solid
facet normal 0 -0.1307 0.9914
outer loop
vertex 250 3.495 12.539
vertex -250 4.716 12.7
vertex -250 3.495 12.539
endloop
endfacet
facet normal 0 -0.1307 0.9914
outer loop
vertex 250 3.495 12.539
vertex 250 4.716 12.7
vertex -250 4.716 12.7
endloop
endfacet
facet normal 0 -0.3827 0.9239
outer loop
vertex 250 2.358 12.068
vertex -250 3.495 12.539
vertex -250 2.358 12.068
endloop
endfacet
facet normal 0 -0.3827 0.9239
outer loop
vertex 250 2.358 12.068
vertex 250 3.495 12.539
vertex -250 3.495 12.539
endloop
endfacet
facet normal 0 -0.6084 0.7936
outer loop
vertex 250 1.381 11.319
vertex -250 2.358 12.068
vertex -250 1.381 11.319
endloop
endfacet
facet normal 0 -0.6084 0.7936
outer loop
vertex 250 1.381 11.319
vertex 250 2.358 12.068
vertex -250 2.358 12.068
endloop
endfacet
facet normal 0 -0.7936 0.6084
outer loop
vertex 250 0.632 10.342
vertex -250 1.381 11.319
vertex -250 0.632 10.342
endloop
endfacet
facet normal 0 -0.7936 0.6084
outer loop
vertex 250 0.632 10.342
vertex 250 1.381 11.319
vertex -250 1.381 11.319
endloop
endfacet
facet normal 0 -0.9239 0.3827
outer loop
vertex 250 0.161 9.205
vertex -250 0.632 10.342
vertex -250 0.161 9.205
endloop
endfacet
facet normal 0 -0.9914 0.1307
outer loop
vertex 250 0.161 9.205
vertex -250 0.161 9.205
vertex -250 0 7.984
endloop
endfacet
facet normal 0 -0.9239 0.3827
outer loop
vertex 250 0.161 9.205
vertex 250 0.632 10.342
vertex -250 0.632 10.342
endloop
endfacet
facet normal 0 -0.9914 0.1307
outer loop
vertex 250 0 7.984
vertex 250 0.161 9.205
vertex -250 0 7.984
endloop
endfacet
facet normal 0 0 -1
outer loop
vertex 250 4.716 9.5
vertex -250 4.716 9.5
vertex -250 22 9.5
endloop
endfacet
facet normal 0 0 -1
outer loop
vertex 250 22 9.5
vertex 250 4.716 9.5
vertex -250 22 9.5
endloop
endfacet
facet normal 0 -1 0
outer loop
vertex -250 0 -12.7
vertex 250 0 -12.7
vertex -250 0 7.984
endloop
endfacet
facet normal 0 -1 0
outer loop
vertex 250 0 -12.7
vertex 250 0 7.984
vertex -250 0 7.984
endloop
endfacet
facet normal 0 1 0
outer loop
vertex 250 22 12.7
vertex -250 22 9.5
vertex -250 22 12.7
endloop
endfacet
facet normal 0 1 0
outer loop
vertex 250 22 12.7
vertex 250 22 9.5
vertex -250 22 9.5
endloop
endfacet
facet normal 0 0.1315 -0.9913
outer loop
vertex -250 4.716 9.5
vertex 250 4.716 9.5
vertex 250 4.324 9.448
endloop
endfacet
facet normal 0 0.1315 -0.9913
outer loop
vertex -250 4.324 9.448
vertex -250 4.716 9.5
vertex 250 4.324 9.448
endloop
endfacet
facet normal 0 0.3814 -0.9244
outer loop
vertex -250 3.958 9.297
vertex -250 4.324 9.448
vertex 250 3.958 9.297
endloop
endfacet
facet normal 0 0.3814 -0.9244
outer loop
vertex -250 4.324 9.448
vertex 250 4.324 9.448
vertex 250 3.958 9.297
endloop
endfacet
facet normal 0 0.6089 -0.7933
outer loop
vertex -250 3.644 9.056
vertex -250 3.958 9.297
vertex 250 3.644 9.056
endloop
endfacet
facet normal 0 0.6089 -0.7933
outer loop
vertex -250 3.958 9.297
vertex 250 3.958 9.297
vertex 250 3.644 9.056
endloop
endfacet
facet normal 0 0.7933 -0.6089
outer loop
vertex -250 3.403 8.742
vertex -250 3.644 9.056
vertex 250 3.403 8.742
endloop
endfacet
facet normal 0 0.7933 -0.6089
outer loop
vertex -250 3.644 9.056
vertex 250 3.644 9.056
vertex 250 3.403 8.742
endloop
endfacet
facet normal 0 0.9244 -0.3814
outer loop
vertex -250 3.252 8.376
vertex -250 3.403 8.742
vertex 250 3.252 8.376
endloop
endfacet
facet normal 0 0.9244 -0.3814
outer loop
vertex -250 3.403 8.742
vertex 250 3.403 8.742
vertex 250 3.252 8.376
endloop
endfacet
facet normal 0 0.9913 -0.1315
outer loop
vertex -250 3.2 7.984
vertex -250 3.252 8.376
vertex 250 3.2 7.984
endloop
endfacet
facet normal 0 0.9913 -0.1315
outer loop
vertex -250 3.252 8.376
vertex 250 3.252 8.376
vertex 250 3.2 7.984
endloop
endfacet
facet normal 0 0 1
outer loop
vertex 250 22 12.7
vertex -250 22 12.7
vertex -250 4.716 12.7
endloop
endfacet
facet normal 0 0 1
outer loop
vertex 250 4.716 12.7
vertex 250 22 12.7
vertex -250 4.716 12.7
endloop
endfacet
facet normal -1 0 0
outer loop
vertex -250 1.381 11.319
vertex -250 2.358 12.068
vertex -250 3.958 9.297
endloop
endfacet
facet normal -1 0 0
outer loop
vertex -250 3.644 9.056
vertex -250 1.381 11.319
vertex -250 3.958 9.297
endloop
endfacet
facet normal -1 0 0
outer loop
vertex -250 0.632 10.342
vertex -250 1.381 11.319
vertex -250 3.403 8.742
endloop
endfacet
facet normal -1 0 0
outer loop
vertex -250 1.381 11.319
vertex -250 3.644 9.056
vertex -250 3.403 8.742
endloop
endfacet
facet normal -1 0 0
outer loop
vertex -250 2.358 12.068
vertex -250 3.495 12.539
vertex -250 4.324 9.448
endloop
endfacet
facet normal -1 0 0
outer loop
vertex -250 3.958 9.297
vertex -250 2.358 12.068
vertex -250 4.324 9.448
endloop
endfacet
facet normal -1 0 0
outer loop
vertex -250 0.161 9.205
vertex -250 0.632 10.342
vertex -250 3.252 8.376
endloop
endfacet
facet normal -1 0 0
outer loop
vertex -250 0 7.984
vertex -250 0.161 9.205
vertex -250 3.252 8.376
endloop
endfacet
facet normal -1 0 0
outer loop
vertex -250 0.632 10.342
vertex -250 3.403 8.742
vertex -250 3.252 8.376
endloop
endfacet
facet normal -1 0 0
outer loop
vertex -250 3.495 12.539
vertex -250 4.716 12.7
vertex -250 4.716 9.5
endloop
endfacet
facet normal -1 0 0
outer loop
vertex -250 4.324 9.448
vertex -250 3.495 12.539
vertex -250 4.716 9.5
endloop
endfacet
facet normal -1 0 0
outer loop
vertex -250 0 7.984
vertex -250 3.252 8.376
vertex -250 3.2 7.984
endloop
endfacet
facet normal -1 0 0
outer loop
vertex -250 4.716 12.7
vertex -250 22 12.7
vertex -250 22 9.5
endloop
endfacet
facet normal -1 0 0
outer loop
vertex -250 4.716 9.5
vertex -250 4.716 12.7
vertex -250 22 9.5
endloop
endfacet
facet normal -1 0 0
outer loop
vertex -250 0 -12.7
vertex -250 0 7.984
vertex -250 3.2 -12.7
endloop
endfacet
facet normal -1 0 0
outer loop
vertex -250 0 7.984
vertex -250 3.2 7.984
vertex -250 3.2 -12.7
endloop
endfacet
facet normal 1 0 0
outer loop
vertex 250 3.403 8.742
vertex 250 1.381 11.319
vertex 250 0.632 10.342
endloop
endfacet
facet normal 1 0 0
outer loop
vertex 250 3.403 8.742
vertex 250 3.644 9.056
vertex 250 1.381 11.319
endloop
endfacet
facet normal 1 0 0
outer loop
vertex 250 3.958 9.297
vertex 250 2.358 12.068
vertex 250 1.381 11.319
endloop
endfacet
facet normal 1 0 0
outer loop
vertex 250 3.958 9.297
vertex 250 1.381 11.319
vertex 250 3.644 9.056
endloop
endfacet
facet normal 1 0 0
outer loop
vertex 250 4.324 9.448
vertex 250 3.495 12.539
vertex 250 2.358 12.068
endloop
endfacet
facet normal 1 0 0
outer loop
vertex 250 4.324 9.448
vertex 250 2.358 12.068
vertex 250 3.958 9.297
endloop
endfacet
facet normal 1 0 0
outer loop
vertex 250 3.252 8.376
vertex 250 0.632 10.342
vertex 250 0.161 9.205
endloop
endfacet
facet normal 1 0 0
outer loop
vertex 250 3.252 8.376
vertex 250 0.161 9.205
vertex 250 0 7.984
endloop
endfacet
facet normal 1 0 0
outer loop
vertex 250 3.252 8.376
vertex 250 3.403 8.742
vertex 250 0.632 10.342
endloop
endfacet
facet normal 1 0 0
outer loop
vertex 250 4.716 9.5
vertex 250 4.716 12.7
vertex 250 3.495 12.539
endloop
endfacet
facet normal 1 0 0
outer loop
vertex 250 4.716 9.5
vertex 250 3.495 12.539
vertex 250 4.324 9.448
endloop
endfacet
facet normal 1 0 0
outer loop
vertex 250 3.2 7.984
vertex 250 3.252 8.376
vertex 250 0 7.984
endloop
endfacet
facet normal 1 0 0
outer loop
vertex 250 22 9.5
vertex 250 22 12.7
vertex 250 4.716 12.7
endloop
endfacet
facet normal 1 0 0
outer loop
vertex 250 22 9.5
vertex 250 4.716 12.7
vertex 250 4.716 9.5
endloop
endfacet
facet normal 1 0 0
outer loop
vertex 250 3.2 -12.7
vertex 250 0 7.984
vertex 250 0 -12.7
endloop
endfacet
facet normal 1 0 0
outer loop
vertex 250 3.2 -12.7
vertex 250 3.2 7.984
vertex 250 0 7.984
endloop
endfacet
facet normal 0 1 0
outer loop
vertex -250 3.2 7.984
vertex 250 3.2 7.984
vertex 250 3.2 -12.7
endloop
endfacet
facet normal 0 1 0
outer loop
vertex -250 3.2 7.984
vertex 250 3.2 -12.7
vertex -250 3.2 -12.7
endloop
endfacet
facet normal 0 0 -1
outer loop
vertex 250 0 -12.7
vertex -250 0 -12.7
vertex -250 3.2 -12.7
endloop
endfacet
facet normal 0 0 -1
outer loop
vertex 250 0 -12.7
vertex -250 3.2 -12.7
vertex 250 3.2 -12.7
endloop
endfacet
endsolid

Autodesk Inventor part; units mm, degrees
ref_plane "YZ Plane" through (0, 0, 0) normal (1, 0, 0) x (0, 1, 0)
ref_plane "XZ Plane" through (0, 0, 0) normal (0, 1, 0) x (-1, 0, 0)
ref_plane "XY Plane" through (0, 0, 0) normal (0, 0, 1) x (1, 0, 0)
sketch "Sketch1" plane through (0, 0, 0) normal (0, 1, 0) x (-1, 0, 0)
  line L0 (-250, 12.7) -> (250, 12.7)
  line L1 (250, 12.7) -> (250, -12.7)
  line L2 (250, -12.7) -> (-250, -12.7)
  line L3 (-250, -12.7) -> (-250, 12.7)
  line L4 (-250, 12.7) -> (250, -12.7) construction
  line L5 (250, 12.7) -> (-250, -12.7) construction
  point P0 (0, 0)
  dimension "d0" = 500
  dimension "d1" = 25.4
extrude "Plate1" add sketch "Sketch1" along normal blind 3.2
sketch "Sketch2" plane through (250, 0, 9.5) normal (0, 0, 1) x (1, 0, 0)
  line L0 (-500, 0) -> (0, 0)
  line L1 (0, 0) -> (0, 22)
  line L2 (0, 22) -> (-500, 22)
  line L3 (-500, 22) -> (-500, 0)
edge flange "Flange1" height 22 angle 90 thickness 3.2 bend radius 1.516 thickness toward (0, 0, 1) relief tear relief width 3.2 relief depth 1.6 edges at (0, 3.2, 12.7) wall of the first edge with corners at (-250, 0, 9.5) (250, 0, 9.5) (250, 22, 9.5) (-250, 22, 9.5)
bend "Bend1"
corner "Corner1"
equation "\"d2\" = Thickness"
equation "\"d3\" = BendReliefWidth"
equation "\"d4\" = BendReliefDepth"
equation "\"d5\" = MinimumRemnant"
equation "\"d6\" = TransitionRadius"
equation "\"d9\" = BendRadius"
equation "\"d10\" = CornerReliefSize"
equation "\"d11\" = GapSize"
equation "\"d12\" = JacobiRadiusSize"
equation "\"BendReliefWidth\" = Thickness"
equation "\"BendReliefDepth\" = 0.5 * Thickness"
equation "\"CornerReliefSize\" = 4 * Thickness"
equation "\"MinimumRemnant\" = 2 * Thickness"
equation "\"TransitionRadius\" = BendRadius"
equation "\"JacobiRadiusSize\" = BendRadius"
equation "\"GapSize\" = Thickness"
equation "\"Thickness\" = 3.2"
equation "\"BendRadius\" = 1.516"
properties part number "SP33V1 Tope Base"
